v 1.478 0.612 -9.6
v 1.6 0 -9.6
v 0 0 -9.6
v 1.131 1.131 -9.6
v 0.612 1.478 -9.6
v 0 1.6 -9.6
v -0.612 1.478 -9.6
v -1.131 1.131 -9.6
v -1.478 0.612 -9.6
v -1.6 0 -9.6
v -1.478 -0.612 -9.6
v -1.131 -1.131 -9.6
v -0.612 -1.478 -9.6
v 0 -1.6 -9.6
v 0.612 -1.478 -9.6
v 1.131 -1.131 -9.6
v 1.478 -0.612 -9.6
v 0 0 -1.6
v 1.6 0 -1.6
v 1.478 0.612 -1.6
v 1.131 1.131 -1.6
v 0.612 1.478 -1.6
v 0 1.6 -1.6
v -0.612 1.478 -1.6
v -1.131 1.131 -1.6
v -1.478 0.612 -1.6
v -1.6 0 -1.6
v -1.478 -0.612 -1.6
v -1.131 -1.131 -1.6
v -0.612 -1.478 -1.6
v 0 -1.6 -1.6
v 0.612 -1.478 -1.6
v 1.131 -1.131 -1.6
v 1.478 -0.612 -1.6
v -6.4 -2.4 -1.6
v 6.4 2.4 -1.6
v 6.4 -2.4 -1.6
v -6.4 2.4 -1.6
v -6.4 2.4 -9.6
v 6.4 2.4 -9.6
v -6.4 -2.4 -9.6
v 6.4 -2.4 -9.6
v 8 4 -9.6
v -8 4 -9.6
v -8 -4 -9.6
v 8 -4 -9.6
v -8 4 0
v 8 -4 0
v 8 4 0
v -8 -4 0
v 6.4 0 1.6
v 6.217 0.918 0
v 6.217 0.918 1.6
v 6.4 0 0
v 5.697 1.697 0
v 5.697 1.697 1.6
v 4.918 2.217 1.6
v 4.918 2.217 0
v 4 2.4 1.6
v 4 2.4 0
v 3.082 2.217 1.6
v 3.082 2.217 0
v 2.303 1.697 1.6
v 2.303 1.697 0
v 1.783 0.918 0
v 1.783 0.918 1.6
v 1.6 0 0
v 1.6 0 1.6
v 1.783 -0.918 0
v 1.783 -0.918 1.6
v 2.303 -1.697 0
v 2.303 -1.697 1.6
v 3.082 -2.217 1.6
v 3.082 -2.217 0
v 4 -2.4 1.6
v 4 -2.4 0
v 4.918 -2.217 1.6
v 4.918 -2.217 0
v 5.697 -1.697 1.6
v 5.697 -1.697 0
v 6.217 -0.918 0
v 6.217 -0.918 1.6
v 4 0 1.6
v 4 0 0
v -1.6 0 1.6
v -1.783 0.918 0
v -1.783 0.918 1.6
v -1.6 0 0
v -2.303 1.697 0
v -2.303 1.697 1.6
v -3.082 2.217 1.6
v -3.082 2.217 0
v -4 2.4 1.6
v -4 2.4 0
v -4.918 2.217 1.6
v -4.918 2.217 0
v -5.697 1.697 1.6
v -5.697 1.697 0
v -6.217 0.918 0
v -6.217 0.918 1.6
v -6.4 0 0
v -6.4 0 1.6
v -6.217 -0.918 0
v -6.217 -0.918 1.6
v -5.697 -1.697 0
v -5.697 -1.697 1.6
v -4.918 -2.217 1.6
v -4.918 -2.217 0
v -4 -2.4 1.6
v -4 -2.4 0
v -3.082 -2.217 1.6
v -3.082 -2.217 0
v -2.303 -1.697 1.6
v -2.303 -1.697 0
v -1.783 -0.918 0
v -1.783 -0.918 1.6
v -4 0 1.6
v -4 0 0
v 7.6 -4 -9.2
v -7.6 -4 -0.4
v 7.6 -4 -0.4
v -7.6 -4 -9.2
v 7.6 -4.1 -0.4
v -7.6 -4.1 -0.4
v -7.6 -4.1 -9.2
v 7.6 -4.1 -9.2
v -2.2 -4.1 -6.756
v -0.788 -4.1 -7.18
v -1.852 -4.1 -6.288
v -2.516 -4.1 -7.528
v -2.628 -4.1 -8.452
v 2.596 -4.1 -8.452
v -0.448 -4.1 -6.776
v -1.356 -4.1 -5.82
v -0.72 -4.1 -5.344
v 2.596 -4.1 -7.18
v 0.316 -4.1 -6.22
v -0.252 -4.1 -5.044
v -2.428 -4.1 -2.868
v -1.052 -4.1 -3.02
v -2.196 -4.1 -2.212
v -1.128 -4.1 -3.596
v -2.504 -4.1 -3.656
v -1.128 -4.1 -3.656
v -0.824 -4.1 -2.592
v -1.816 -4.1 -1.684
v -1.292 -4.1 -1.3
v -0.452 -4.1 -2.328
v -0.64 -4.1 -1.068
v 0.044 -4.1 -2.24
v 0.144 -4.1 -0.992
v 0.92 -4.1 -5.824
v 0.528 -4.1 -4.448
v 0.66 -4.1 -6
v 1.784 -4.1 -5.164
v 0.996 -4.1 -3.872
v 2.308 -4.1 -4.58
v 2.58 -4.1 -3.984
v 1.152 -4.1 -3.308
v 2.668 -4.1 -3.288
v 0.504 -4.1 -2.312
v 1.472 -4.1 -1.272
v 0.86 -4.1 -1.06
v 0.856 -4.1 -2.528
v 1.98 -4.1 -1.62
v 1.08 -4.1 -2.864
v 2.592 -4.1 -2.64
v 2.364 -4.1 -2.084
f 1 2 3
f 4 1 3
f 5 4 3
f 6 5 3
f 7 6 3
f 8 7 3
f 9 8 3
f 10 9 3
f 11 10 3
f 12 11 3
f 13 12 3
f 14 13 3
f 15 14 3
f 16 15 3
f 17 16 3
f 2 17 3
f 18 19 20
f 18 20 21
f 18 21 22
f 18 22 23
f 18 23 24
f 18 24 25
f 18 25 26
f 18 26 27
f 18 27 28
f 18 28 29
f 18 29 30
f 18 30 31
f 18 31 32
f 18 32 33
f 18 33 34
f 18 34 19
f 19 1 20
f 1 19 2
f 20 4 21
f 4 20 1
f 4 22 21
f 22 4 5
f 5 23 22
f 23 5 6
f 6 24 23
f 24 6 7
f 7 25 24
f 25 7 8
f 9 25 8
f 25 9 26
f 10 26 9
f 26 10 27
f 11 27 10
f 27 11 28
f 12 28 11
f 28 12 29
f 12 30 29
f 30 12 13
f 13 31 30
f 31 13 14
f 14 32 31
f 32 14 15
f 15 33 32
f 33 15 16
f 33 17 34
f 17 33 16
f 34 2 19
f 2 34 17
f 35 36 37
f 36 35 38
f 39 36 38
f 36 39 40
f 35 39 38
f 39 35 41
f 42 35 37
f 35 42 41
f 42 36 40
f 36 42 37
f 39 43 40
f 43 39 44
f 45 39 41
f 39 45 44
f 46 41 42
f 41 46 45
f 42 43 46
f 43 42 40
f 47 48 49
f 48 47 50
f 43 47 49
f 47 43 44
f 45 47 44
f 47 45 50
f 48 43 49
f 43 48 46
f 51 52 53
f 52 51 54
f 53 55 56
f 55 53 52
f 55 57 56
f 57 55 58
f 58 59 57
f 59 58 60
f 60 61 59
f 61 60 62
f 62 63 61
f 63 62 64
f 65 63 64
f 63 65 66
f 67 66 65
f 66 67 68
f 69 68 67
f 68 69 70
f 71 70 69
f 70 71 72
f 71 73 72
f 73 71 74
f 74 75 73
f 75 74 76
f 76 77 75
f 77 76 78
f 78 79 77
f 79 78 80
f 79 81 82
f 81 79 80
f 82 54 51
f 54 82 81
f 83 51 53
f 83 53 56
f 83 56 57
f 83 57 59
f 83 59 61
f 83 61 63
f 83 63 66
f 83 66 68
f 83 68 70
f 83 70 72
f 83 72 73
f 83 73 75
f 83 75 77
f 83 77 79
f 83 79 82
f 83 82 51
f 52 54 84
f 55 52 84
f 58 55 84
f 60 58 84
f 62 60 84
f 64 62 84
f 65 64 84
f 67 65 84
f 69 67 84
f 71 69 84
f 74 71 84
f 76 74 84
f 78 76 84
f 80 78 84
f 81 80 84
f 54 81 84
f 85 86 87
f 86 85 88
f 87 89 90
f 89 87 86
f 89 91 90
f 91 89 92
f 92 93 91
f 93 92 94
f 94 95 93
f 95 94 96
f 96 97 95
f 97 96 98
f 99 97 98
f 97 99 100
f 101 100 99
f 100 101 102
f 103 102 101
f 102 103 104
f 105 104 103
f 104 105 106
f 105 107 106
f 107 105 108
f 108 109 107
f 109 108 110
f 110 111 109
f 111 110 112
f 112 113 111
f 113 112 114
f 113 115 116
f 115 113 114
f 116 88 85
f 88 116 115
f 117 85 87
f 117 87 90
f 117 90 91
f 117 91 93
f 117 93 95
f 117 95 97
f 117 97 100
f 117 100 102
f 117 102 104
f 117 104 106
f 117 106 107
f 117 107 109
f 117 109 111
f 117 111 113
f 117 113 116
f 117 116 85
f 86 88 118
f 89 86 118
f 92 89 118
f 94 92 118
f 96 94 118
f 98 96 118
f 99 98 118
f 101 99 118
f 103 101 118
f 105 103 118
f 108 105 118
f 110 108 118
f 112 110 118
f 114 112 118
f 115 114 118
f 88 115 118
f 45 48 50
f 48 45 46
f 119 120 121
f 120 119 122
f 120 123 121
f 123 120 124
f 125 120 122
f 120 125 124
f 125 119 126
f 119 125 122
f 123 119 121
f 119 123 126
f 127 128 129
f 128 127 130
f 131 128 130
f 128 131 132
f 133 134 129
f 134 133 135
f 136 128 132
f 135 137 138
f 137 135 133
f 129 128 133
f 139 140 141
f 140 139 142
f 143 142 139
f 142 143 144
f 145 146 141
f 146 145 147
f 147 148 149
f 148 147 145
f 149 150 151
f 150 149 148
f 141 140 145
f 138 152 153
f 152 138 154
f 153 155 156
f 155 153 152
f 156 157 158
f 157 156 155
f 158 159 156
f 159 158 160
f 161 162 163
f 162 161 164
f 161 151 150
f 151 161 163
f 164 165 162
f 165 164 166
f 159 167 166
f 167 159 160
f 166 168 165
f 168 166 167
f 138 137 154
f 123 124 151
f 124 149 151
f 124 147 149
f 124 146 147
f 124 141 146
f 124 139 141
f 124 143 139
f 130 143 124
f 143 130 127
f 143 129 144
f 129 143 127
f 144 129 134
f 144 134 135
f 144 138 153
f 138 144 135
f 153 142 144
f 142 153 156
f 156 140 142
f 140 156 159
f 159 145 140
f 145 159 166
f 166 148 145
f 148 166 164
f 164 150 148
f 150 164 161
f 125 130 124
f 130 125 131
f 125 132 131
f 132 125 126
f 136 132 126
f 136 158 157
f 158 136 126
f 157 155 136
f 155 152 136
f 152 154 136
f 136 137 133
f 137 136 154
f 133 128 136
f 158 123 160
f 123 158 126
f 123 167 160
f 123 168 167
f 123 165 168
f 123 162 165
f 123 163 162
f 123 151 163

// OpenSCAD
// file: ../p/4-4edge.scad
use <../lib.scad>
function ldraw_lib__4_4edge() = [
// 0 Circle 1.0
// 0 Name: 4-4edge.dat
// 0 Author: James Jessiman
// 0 !LDRAW_ORG Primitive UPDATE 2017-01
// 0 !LICENSE Licensed under CC BY 2.0 and CC BY 4.0 : see CAreadme.txt
// 
// 0 BFC CERTIFY CCW
  [0,"BFC","CERTIFY"],
  [0,"BFC","CCW"],
// 
// 0 !HISTORY 1998-12-15 [PTadmin] Official Update 1998-10
// 0 !HISTORY 2005-12-28 [PTadmin] Official Update 2005-01
// 0 !HISTORY 2007-06-24 [PTadmin] Header formatted for Contributor Agreement
// 0 !HISTORY 2008-07-01 [PTadmin] Official Update 2008-01
// 0 !HISTORY 2017-01-15 [Steffen] BFCed
// 0 !HISTORY 2017-12-30 [PTadmin] Official Update 2017-01
// 
// 
// 2 24 1 0 0 0.9239 0 0.3827
  [2,24,1,0,0,0.9239,0,0.3827],
// 2 24 0.9239 0 0.3827 0.7071 0 0.7071
  [2,24,0.9239,0,0.3827,0.7071,0,0.7071],
// 2 24 0.7071 0 0.7071 0.3827 0 0.9239
  [2,24,0.7071,0,0.7071,0.3827,0,0.9239],
// 2 24 0.3827 0 0.9239 0 0 1
  [2,24,0.3827,0,0.9239,0,0,1],
// 2 24 0 0 1 -0.3827 0 0.9239
  [2,24,0,0,1,-0.3827,0,0.9239],
// 2 24 -0.3827 0 0.9239 -0.7071 0 0.7071
  [2,24,-0.3827,0,0.9239,-0.7071,0,0.7071],
// 2 24 -0.7071 0 0.7071 -0.9239 0 0.3827
  [2,24,-0.7071,0,0.7071,-0.9239,0,0.3827],
// 2 24 -0.9239 0 0.3827 -1 0 -0
  [2,24,-0.9239,0,0.3827,-1,0,-0],
// 2 24 -1 0 -0 -0.9239 0 -0.3827
  [2,24,-1,0,-0,-0.9239,0,-0.3827],
// 2 24 -0.9239 0 -0.3827 -0.7071 0 -0.7071
  [2,24,-0.9239,0,-0.3827,-0.7071,0,-0.7071],
// 2 24 -0.7071 0 -0.7071 -0.3827 0 -0.9239
  [2,24,-0.7071,0,-0.7071,-0.3827,0,-0.9239],
// 2 24 -0.3827 0 -0.9239 0 0 -1
  [2,24,-0.3827,0,-0.9239,0,0,-1],
// 2 24 0 0 -1 0.3827 0 -0.9239
  [2,24,0,0,-1,0.3827,0,-0.9239],
// 2 24 0.3827 0 -0.9239 0.7071 0 -0.7071
  [2,24,0.3827,0,-0.9239,0.7071,0,-0.7071],
// 2 24 0.7071 0 -0.7071 0.9239 0 -0.3827
  [2,24,0.7071,0,-0.7071,0.9239,0,-0.3827],
// 2 24 0.9239 0 -0.3827 1 0 0
  [2,24,0.9239,0,-0.3827,1,0,0],
];
module ldraw_lib__4_4edge(step=0, col=false, unit=2/5, alt=false, line=0.2, solid=!$preview)
    makepoly(ldraw_lib__4_4edge(), step=step, col=col, unit=unit, alt=alt, line=line, solid=solid);
ldraw_lib__4_4edge(line=0.2);
// file: ../p/4-4disc.scad
use <../lib.scad>
function ldraw_lib__4_4disc() = [
// 0 Disc 1.0
// 0 Name: 4-4disc.dat
// 0 Author: James Jessiman
// 0 !LDRAW_ORG Primitive UPDATE 2002-02
// 0 !LICENSE Licensed under CC BY 2.0 and CC BY 4.0 : see CAreadme.txt
// 
// 0 BFC CERTIFY CCW
  [0,"BFC","CERTIFY"],
  [0,"BFC","CCW"],
// 
// 0 !HISTORY 1998-12-15 [PTadmin] Official Update 1998-10
// 0 !HISTORY 2002-03-23 [sbliss] Added BFC statement
// 0 !HISTORY 2002-04-25 [PTadmin] Official Update 2002-02
// 0 !HISTORY 2007-06-24 [PTadmin] Header formatted for Contributor Agreement
// 0 !HISTORY 2008-07-01 [PTadmin] Official Update 2008-01
// 
// 
// 3 16 0 0 0 1 0 0 0.9239 0 0.3827
  [3,16,0,0,0,1,0,0,0.9239,0,0.3827],
// 3 16 0 0 0 0.9239 0 0.3827 0.7071 0 0.7071
  [3,16,0,0,0,0.9239,0,0.3827,0.7071,0,0.7071],
// 3 16 0 0 0 0.7071 0 0.7071 0.3827 0 0.9239
  [3,16,0,0,0,0.7071,0,0.7071,0.3827,0,0.9239],
// 3 16 0 0 0 0.3827 0 0.9239 0 0 1
  [3,16,0,0,0,0.3827,0,0.9239,0,0,1],
// 3 16 0 0 0 0 0 1 -0.3827 0 0.9239
  [3,16,0,0,0,0,0,1,-0.3827,0,0.9239],
// 3 16 0 0 0 -0.3827 0 0.9239 -0.7071 0 0.7071
  [3,16,0,0,0,-0.3827,0,0.9239,-0.7071,0,0.7071],
// 3 16 0 0 0 -0.7071 0 0.7071 -0.9239 0 0.3827
  [3,16,0,0,0,-0.7071,0,0.7071,-0.9239,0,0.3827],
// 3 16 0 0 0 -0.9239 0 0.3827 -1 0 -0
  [3,16,0,0,0,-0.9239,0,0.3827,-1,0,-0],
// 3 16 0 0 0 -1 0 -0 -0.9239 0 -0.3827
  [3,16,0,0,0,-1,0,-0,-0.9239,0,-0.3827],
// 3 16 0 0 0 -0.9239 0 -0.3827 -0.7071 0 -0.7071
  [3,16,0,0,0,-0.9239,0,-0.3827,-0.7071,0,-0.7071],
// 3 16 0 0 0 -0.7071 0 -0.7071 -0.3827 0 -0.9239
  [3,16,0,0,0,-0.7071,0,-0.7071,-0.3827,0,-0.9239],
// 3 16 0 0 0 -0.3827 0 -0.9239 0 0 -1
  [3,16,0,0,0,-0.3827,0,-0.9239,0,0,-1],
// 3 16 0 0 0 0 0 -1 0.3827 0 -0.9239
  [3,16,0,0,0,0,0,-1,0.3827,0,-0.9239],
// 3 16 0 0 0 0.3827 0 -0.9239 0.7071 0 -0.7071
  [3,16,0,0,0,0.3827,0,-0.9239,0.7071,0,-0.7071],
// 3 16 0 0 0 0.7071 0 -0.7071 0.9239 0 -0.3827
  [3,16,0,0,0,0.7071,0,-0.7071,0.9239,0,-0.3827],
// 3 16 0 0 0 0.9239 0 -0.3827 1 0 0
  [3,16,0,0,0,0.9239,0,-0.3827,1,0,0],
// 0
];
module ldraw_lib__4_4disc(step=0, col=false, unit=2/5, alt=false, line=0.2, solid=!$preview)
    makepoly(ldraw_lib__4_4disc(), step=step, col=col, unit=unit, alt=alt, line=line, solid=solid);
ldraw_lib__4_4disc(line=0.2);
// file: ../p/4-4cyli.scad
use <../lib.scad>
$fa=1; $fs=0.2;
function ldraw_lib__4_4cyli(realsolid=false) = [
// 0 Cylinder 1.0
// 0 Name: 4-4cyli.dat
// 0 Author: James Jessiman
// 0 !LDRAW_ORG Primitive UPDATE 2005-01
// 0 !LICENSE Licensed under CC BY 2.0 and CC BY 4.0 : see CAreadme.txt
// 
// 0 BFC CERTIFY CCW
  [0,"BFC","CERTIFY"],
  [0,"BFC","CCW"],
// 
// 0 !HISTORY 1998-12-15 [PTadmin] Official Update 1998-10
// 0 !HISTORY 2002-03-23 [sbliss] Added BFC statement; merged headers from files in distributions LDraw 0.27 and Complete.
// 0 !HISTORY 2002-04-25 [PTadmin] Official Update 2002-02
// 0 !HISTORY 2004-12-14 [guyvivan] BFC CCW
// 0 !HISTORY 2005-12-28 [PTadmin] Official Update 2005-01
// 0 !HISTORY 2007-06-24 [PTadmin] Header formatted for Contributor Agreement
// 0 !HISTORY 2008-07-01 [PTadmin] Official Update 2008-01
// 
// 
// 4 16 1 1 0 0.9239 1 0.3827 0.9239 0 0.3827 1 0 0
  [4,16,1,1,0,0.9239,1,0.3827,0.9239,0,0.3827,1,0,0],
// 5 24 1 0 0 1 1 0 0.9239 0 0.3827 0.9239 0 -0.3827
  [5,24,1,0,0,1,1,0,0.9239,0,0.3827,0.9239,0,-0.3827],
// 4 16 0.9239 1 0.3827 0.7071 1 0.7071 0.7071 0 0.7071 0.9239 0 0.3827
  [4,16,0.9239,1,0.3827,0.7071,1,0.7071,0.7071,0,0.7071,0.9239,0,0.3827],
// 5 24 0.9239 0 0.3827 0.9239 1 0.3827 0.7071 0 0.7071 1 0 0
  [5,24,0.9239,0,0.3827,0.9239,1,0.3827,0.7071,0,0.7071,1,0,0],
// 4 16 0.7071 1 0.7071 0.3827 1 0.9239 0.3827 0 0.9239 0.7071 0 0.7071
  [4,16,0.7071,1,0.7071,0.3827,1,0.9239,0.3827,0,0.9239,0.7071,0,0.7071],
// 5 24 0.7071 0 0.7071 0.7071 1 0.7071 0.3827 0 0.9239 0.9239 0 0.3827
  [5,24,0.7071,0,0.7071,0.7071,1,0.7071,0.3827,0,0.9239,0.9239,0,0.3827],
// 4 16 0.3827 1 0.9239 0 1 1 0 0 1 0.3827 0 0.9239
  [4,16,0.3827,1,0.9239,0,1,1,0,0,1,0.3827,0,0.9239],
// 5 24 0.3827 0 0.9239 0.3827 1 0.9239 0 0 1 0.7071 0 0.7071
  [5,24,0.3827,0,0.9239,0.3827,1,0.9239,0,0,1,0.7071,0,0.7071],
// 4 16 0 1 1 -0.3827 1 0.9239 -0.3827 0 0.9239 0 0 1
  [4,16,0,1,1,-0.3827,1,0.9239,-0.3827,0,0.9239,0,0,1],
// 5 24 0 0 1 0 1 1 -0.3827 0 0.9239 0.3827 0 0.9239
  [5,24,0,0,1,0,1,1,-0.3827,0,0.9239,0.3827,0,0.9239],
// 4 16 -0.3827 1 0.9239 -0.7071 1 0.7071 -0.7071 0 0.7071 -0.3827 0 0.9239
  [4,16,-0.3827,1,0.9239,-0.7071,1,0.7071,-0.7071,0,0.7071,-0.3827,0,0.9239],
// 5 24 -0.3827 0 0.9239 -0.3827 1 0.9239 -0.7071 0 0.7071 0 0 1
  [5,24,-0.3827,0,0.9239,-0.3827,1,0.9239,-0.7071,0,0.7071,0,0,1],
// 4 16 -0.7071 1 0.7071 -0.9239 1 0.3827 -0.9239 0 0.3827 -0.7071 0 0.7071
  [4,16,-0.7071,1,0.7071,-0.9239,1,0.3827,-0.9239,0,0.3827,-0.7071,0,0.7071],
// 5 24 -0.7071 0 0.7071 -0.7071 1 0.7071 -0.9239 0 0.3827 -0.3827 0 0.9239
  [5,24,-0.7071,0,0.7071,-0.7071,1,0.7071,-0.9239,0,0.3827,-0.3827,0,0.9239],
// 4 16 -0.9239 1 0.3827 -1 1 0 -1 0 0 -0.9239 0 0.3827
  [4,16,-0.9239,1,0.3827,-1,1,0,-1,0,0,-0.9239,0,0.3827],
// 5 24 -0.9239 0 0.3827 -0.9239 1 0.3827 -1 0 0 -0.7071 0 0.7071
  [5,24,-0.9239,0,0.3827,-0.9239,1,0.3827,-1,0,0,-0.7071,0,0.7071],
// 4 16 -1 1 0 -0.9239 1 -0.3827 -0.9239 0 -0.3827 -1 0 0
  [4,16,-1,1,0,-0.9239,1,-0.3827,-0.9239,0,-0.3827,-1,0,0],
// 5 24 -1 0 0 -1 1 0 -0.9239 0 -0.3827 -0.9239 0 0.3827
  [5,24,-1,0,0,-1,1,0,-0.9239,0,-0.3827,-0.9239,0,0.3827],
// 4 16 -0.9239 1 -0.3827 -0.7071 1 -0.7071 -0.7071 0 -0.7071 -0.9239 0 -0.3827
  [4,16,-0.9239,1,-0.3827,-0.7071,1,-0.7071,-0.7071,0,-0.7071,-0.9239,0,-0.3827],
// 5 24 -0.9239 0 -0.3827 -0.9239 1 -0.3827 -0.7071 0 -0.7071 -1 0 0
  [5,24,-0.9239,0,-0.3827,-0.9239,1,-0.3827,-0.7071,0,-0.7071,-1,0,0],
// 4 16 -0.7071 1 -0.7071 -0.3827 1 -0.9239 -0.3827 0 -0.9239 -0.7071 0 -0.7071
  [4,16,-0.7071,1,-0.7071,-0.3827,1,-0.9239,-0.3827,0,-0.9239,-0.7071,0,-0.7071],
// 5 24 -0.7071 0 -0.7071 -0.7071 1 -0.7071 -0.3827 0 -0.9239 -0.9239 0 -0.3827
  [5,24,-0.7071,0,-0.7071,-0.7071,1,-0.7071,-0.3827,0,-0.9239,-0.9239,0,-0.3827],
// 4 16 -0.3827 1 -0.9239 0 1 -1 0 0 -1 -0.3827 0 -0.9239
  [4,16,-0.3827,1,-0.9239,0,1,-1,0,0,-1,-0.3827,0,-0.9239],
// 5 24 -0.3827 0 -0.9239 -0.3827 1 -0.9239 0 0 -1 -0.7071 0 -0.7071
  [5,24,-0.3827,0,-0.9239,-0.3827,1,-0.9239,0,0,-1,-0.7071,0,-0.7071],
// 4 16 0 1 -1 0.3827 1 -0.9239 0.3827 0 -0.9239 0 0 -1
  [4,16,0,1,-1,0.3827,1,-0.9239,0.3827,0,-0.9239,0,0,-1],
// 5 24 0 0 -1 0 1 -1 0.3827 0 -0.9239 -0.3827 0 -0.9239
  [5,24,0,0,-1,0,1,-1,0.3827,0,-0.9239,-0.3827,0,-0.9239],
// 4 16 0.3827 1 -0.9239 0.7071 1 -0.7071 0.7071 0 -0.7071 0.3827 0 -0.9239
  [4,16,0.3827,1,-0.9239,0.7071,1,-0.7071,0.7071,0,-0.7071,0.3827,0,-0.9239],
// 5 24 0.3827 0 -0.9239 0.3827 1 -0.9239 0.7071 0 -0.7071 0 0 -1
  [5,24,0.3827,0,-0.9239,0.3827,1,-0.9239,0.7071,0,-0.7071,0,0,-1],
// 4 16 0.7071 1 -0.7071 0.9239 1 -0.3827 0.9239 0 -0.3827 0.7071 0 -0.7071
  [4,16,0.7071,1,-0.7071,0.9239,1,-0.3827,0.9239,0,-0.3827,0.7071,0,-0.7071],
// 5 24 0.7071 0 -0.7071 0.7071 1 -0.7071 0.9239 0 -0.3827 0.3827 0 -0.9239
  [5,24,0.7071,0,-0.7071,0.7071,1,-0.7071,0.9239,0,-0.3827,0.3827,0,-0.9239],
// 4 16 0.9239 1 -0.3827 1 1 0 1 0 0 0.9239 0 -0.3827
  [4,16,0.9239,1,-0.3827,1,1,0,1,0,0,0.9239,0,-0.3827],
// 5 24 0.9239 0 -0.3827 0.9239 1 -0.3827 1 0 0 0.7071 0 -0.7071
  [5,24,0.9239,0,-0.3827,0.9239,1,-0.3827,1,0,0,0.7071,0,-0.7071],
// 0
];
module ldraw_lib__4_4cyli(step=0, col=false, unit=2/5, alt=false, line=0.2, solid=!$preview)
    makepoly(ldraw_lib__4_4cyli(solid), step=step, col=col, unit=unit, alt=alt, line=line, solid=solid);
ldraw_lib__4_4cyli(line=0.2);
// file: ../p/stud3.scad
use <../lib.scad>
use <4-4cyli.scad>
use <4-4disc.scad>
use <4-4edge.scad>
function ldraw_lib__stud3() = [
// 0 Stud Tube Solid
// 0 Name: stud3.dat
// 0 Author: James Jessiman
// 0 !LDRAW_ORG Primitive UPDATE 2012-01
// 0 !LICENSE Licensed under CC BY 4.0 : see CAreadme.txt
// 
// 0 BFC CERTIFY CCW
  [0,"BFC","CERTIFY"],
  [0,"BFC","CCW"],
// 
// 0 !HISTORY 2002-04-04 [sbliss] Modified for BFC compliance
// 0 !HISTORY 2002-04-25 [PTadmin] Official Update 2002-02
// 0 !HISTORY 2007-06-24 [PTadmin] Header formatted for Contributor Agreement
// 0 !HISTORY 2008-07-01 [PTadmin] Official Update 2008-01
// 0 !HISTORY 2012-02-16 [Philo] Changed to CCW
// 0 !HISTORY 2012-03-30 [PTadmin] Official Update 2012-01
// 
// 
// 1 16 0 -4 0 4 0 0 0 1 0 0 0 4 4-4edge.dat
  [1,16,0,-4,0,4,0,0,0,1,0,0,0,4, ldraw_lib__4_4edge()],
// 1 16 0 0 0 4 0 0 0 1 0 0 0 4 4-4edge.dat
  [1,16,0,0,0,4,0,0,0,1,0,0,0,4, ldraw_lib__4_4edge()],
// 1 16 0 -4 0 4 0 0 0 1 0 0 0 4 4-4disc.dat
  [1,16,0,-4,0,4,0,0,0,1,0,0,0,4, ldraw_lib__4_4disc()],
  [-1,16,0,0,0,4,0,0,0,-1,0,0,0,4, ldraw_lib__4_4disc()],
// 1 16 0 -4 0 4 0 0 0 4 0 0 0 4 4-4cyli.dat
  [1,16,0,-4,0,4,0,0,0,4,0,0,0,4, ldraw_lib__4_4cyli()],
];
module ldraw_lib__stud3(step=0, col=false, unit=2/5, alt=false, line=0.2, solid=!$preview)
    makepoly(ldraw_lib__stud3(), step=step, col=col, unit=unit, alt=alt, line=line, solid=solid);
ldraw_lib__stud3(line=0.2);
// file: ../p/stud.scad
use <../lib.scad>
use <4-4cyli.scad>
use <4-4disc.scad>
use <4-4edge.scad>
function ldraw_lib__stud() = [
// 0 Stud
// 0 Name: stud.dat
// 0 Author: James Jessiman
// 0 !LDRAW_ORG Primitive UPDATE 2012-01
// 0 !LICENSE Licensed under CC BY 4.0 : see CAreadme.txt
// 
// 0 BFC CERTIFY CCW
  [0,"BFC","CERTIFY"],
  [0,"BFC","CCW"],
// 
// 0 !HISTORY 2002-04-04 [sbliss] Modified for BFC compliance
// 0 !HISTORY 2002-04-25 [PTadmin] Official Update 2002-02
// 0 !HISTORY 2007-06-24 [PTadmin] Header formatted for Contributor Agreement
// 0 !HISTORY 2008-07-01 [PTadmin] Official Update 2008-01
// 0 !HISTORY 2012-02-16 [Philo] Changed to CCW
// 0 !HISTORY 2012-03-30 [PTadmin] Official Update 2012-01
// 
// 
// 1 16 0 0 0 6 0 0 0 1 0 0 0 6 4-4edge.dat
  [1,16,0,0,0,6,0,0,0,1,0,0,0,6, ldraw_lib__4_4edge()],
// 1 16 0 -4 0 6 0 0 0 1 0 0 0 6 4-4edge.dat
  [1,16,0,-4,0,6,0,0,0,1,0,0,0,6, ldraw_lib__4_4edge()],
// 1 16 0 0 0 6 0 0 0 -4 0 0 0 6 4-4cyli.dat
  [1,16,0,0,0,6,0,0,0,-4,0,0,0,6, ldraw_lib__4_4cyli()],
// 1 16 0 -4 0 6 0 0 0 1 0 0 0 6 4-4disc.dat
  [1,16,0,-4,0,6,0,0,0,1,0,0,0,6, ldraw_lib__4_4disc()],
  [-1,16,0,0,0,6,0,0,0,-1,0,0,0,6, ldraw_lib__4_4disc()],
];
module ldraw_lib__stud(step=0, col=false, unit=2/5, alt=false, line=0.2, solid=!$preview)
    makepoly(ldraw_lib__stud(), step=step, col=col, unit=unit, alt=alt, line=line, solid=solid);
ldraw_lib__stud(line=0.2);
// file: ../p/box5.scad
use <../lib.scad>
function ldraw_lib__box5() = [
// 0 Box with 5 Faces and All Edges
// 0 Name: box5.dat
// 0 Author: James Jessiman
// 0 !LDRAW_ORG Primitive UPDATE 2012-01
// 0 !LICENSE Licensed under CC BY 2.0 and CC BY 4.0 : see CAreadme.txt
// 
// 0 BFC CERTIFY CCW
  [0,"BFC","CERTIFY"],
  [0,"BFC","CCW"],
// 
// 0 !HISTORY 2002-04-03 [sbliss] Modified for BFC compliance
// 0 !HISTORY 2002-04-25 [PTadmin] Official Update 2002-02
// 0 !HISTORY 2007-06-24 [PTadmin] Header formatted for Contributor Agreement
// 0 !HISTORY 2008-07-01 [PTadmin] Official Update 2008-01
// 0 !HISTORY 2012-02-16 [Philo] Changed to CCW
// 0 !HISTORY 2012-03-30 [PTadmin] Official Update 2012-01
// 
// 
// 2 24 1 1 1 -1 1 1
  [2,24,1,1,1,-1,1,1],
// 2 24 -1 1 1 -1 1 -1
  [2,24,-1,1,1,-1,1,-1],
// 2 24 -1 1 -1 1 1 -1
  [2,24,-1,1,-1,1,1,-1],
// 2 24 1 1 -1 1 1 1
  [2,24,1,1,-1,1,1,1],
// 2 24 1 0 1 -1 0 1
  [2,24,1,0,1,-1,0,1],
// 2 24 -1 0 1 -1 0 -1
  [2,24,-1,0,1,-1,0,-1],
// 2 24 -1 0 -1 1 0 -1
  [2,24,-1,0,-1,1,0,-1],
// 2 24 1 0 -1 1 0 1
  [2,24,1,0,-1,1,0,1],
// 2 24 1 0 1 1 1 1
  [2,24,1,0,1,1,1,1],
// 2 24 -1 0 1 -1 1 1
  [2,24,-1,0,1,-1,1,1],
// 2 24 1 0 -1 1 1 -1
  [2,24,1,0,-1,1,1,-1],
// 2 24 -1 0 -1 -1 1 -1
  [2,24,-1,0,-1,-1,1,-1],
// 4 16 -1 1 1 1 1 1 1 1 -1 -1 1 -1
  [4,16,-1,1,1,1,1,1,1,1,-1,-1,1,-1],
// 4 16 -1 1 1 -1 0 1 1 0 1 1 1 1
  [4,16,-1,1,1,-1,0,1,1,0,1,1,1,1],
// 4 16 -1 1 -1 -1 0 -1 -1 0 1 -1 1 1
  [4,16,-1,1,-1,-1,0,-1,-1,0,1,-1,1,1],
// 4 16 1 1 -1 1 0 -1 -1 0 -1 -1 1 -1
  [4,16,1,1,-1,1,0,-1,-1,0,-1,-1,1,-1],
// 4 16 1 1 1 1 0 1 1 0 -1 1 1 -1
  [4,16,1,1,1,1,0,1,1,0,-1,1,1,-1],
];
makepoly(ldraw_lib__box5(), line=0.2);
// file: ../p/box4t.scad
use <../lib.scad>
function ldraw_lib__box4t() = [
// 0 Box with 4 Adjacent Faces and All Edges
// 0 Name: box4t.dat
// 0 Author: Tore Eriksson [Tore_Eriksson]
// 0 !LDRAW_ORG Primitive UPDATE 2003-02
// 0 !LICENSE Licensed under CC BY 2.0 and CC BY 4.0 : see CAreadme.txt
// 
// 0 BFC CERTIFY CCW
  [0,"BFC","CERTIFY"],
  [0,"BFC","CCW"],
// 
// 0 !HISTORY 1997-09-29 [PTadmin] Official Update 1997-15
// 0 !HISTORY 2002-08-31 [izanette] Modified with WINDZ for BFC compliance
// 0 !HISTORY 2003-08-01 [PTadmin] Official Update 2003-02
// 0 !HISTORY 2007-06-24 [PTadmin] Header formatted for Contributor Agreement
// 0 !HISTORY 2008-07-01 [PTadmin] Official Update 2008-01
// 
// 
// 2 24 1 1 1 -1 1 1
  [2,24,1,1,1,-1,1,1],
// 2 24 -1 1 1 -1 1 -1
  [2,24,-1,1,1,-1,1,-1],
// 2 24 -1 1 -1 1 1 -1
  [2,24,-1,1,-1,1,1,-1],
// 2 24 1 1 -1 1 1 1
  [2,24,1,1,-1,1,1,1],
// 2 24 1 0 1 -1 0 1
  [2,24,1,0,1,-1,0,1],
// 2 24 -1 0 1 -1 0 -1
  [2,24,-1,0,1,-1,0,-1],
// 2 24 -1 0 -1 1 0 -1
  [2,24,-1,0,-1,1,0,-1],
// 2 24 1 0 -1 1 0 1
  [2,24,1,0,-1,1,0,1],
// 2 24 1 0 1 1 1 1
  [2,24,1,0,1,1,1,1],
// 2 24 -1 0 1 -1 1 1
  [2,24,-1,0,1,-1,1,1],
// 2 24 1 0 -1 1 1 -1
  [2,24,1,0,-1,1,1,-1],
// 2 24 -1 0 -1 -1 1 -1
  [2,24,-1,0,-1,-1,1,-1],
// 4 16 1 1 1 1 1 -1 -1 1 -1 -1 1 1
  [4,16,1,1,1,1,1,-1,-1,1,-1,-1,1,1],
// 4 16 1 1 1 -1 1 1 -1 0 1 1 0 1
  [4,16,1,1,1,-1,1,1,-1,0,1,1,0,1],
// 4 16 -1 1 1 -1 1 -1 -1 0 -1 -1 0 1
  [4,16,-1,1,1,-1,1,-1,-1,0,-1,-1,0,1],
// 0 4 16 -1 1 -1 -1 0 -1 1 0 -1 1 1 -1
// 4 16 1 1 -1 1 1 1 1 0 1 1 0 -1
  [4,16,1,1,-1,1,1,1,1,0,1,1,0,-1],
// 0
];
makepoly(ldraw_lib__box4t(), line=0.2);
// file: s/3004s01.scad
use <../../lib.scad>
use <../../p/box4t.scad>
use <../../p/box5.scad>
use <../../p/stud.scad>
use <../../p/stud3.scad>
$fa=1; $fs=0.2;
function ldraw_lib__s__3004s01(realsolid=false) = [
// 0 ~Brick  1 x  2 without Front Face
// 0 Name: s\3004s01.dat
// 0 Author: James Jessiman
// 0 !LDRAW_ORG Subpart UPDATE 2003-03
// 0 !LICENSE Licensed under CC BY 2.0 and CC BY 4.0 : see CAreadme.txt
// 
// 0 BFC CERTIFY CCW
  [0,"BFC","CERTIFY"],
  [0,"BFC","CCW"],
// 
// 0 !HISTORY 2003-09-07 [jriley] Subfiling, BFC
// 0 !HISTORY 2003-12-19 [PTadmin] Official Update 2003-03
// 0 !HISTORY 2007-08-29 [PTadmin] Header formatted for Contributor Agreement
// 0 !HISTORY 2008-07-01 [PTadmin] Official Update 2008-01
// 
// 
// 1 16 0 4 0 1 0 0 0 -5 0 0 0 1 stud3.dat
  [1,16,0,4,0,1,0,0,0,-5,0,0,0,1, ldraw_lib__stud3(realsolid)],
// 0 BFC INVERTNEXT
  [0,"BFC","INVERTNEXT"],
// 1 16 0 24 0 16 0 0 0 -20 0 0 0 6 box5.dat
  [1,16,0,24,0,16,0,0,0,-20,0,0,0,6, ldraw_lib__box5(realsolid)],
// 4 16 20 24 10 16 24 6 -16 24 6 -20 24 10
  [4,16,20,24,10,16,24,6,-16,24,6,-20,24,10],
// 4 16 -20 24 10 -16 24 6 -16 24 -6 -20 24 -10
  [4,16,-20,24,10,-16,24,6,-16,24,-6,-20,24,-10],
// 4 16 -20 24 -10 -16 24 -6 16 24 -6 20 24 -10
  [4,16,-20,24,-10,-16,24,-6,16,24,-6,20,24,-10],
// 4 16 20 24 -10 16 24 -6 16 24 6 20 24 10
  [4,16,20,24,-10,16,24,-6,16,24,6,20,24,10],
// 1 16 0 24 0 20 0 0 0 -24 0 0 0 10 box4t.dat
  [1,16,0,24,0,20,0,0,0,-24,0,0,0,10, ldraw_lib__box4t(realsolid)],
// 1 16 10 0 0 1 0 0 0 1 0 0 0 1 stud.dat
  [1,16,10,0,0,1,0,0,0,1,0,0,0,1, ldraw_lib__stud(realsolid)],
// 1 16 -10 0 0 1 0 0 0 1 0 0 0 1 stud.dat
  [1,16,-10,0,0,1,0,0,0,1,0,0,0,1, ldraw_lib__stud(realsolid)],
// 0
];
module ldraw_lib__s__3004s01(step=0, col=false, unit=2/5, alt=false, line=0.2, solid=!$preview)
    makepoly(ldraw_lib__s__3004s01(solid), step=step, col=col, unit=unit, alt=alt, line=line, solid=solid);
ldraw_lib__s__3004s01(line=0.2);
// file: s/004452cs02.scad
use <../../lib.scad>
$fa=1; $fs=0.2;
function ldraw_lib__s__004452cs02(realsolid=false) = [
// 0 ~Sticker  1.1 x  1.9 with Number "2" - Background
// 0 Name: s\004452cs02.dat
// 0 Author: Takeshi Takahashi [RainbowDolphin]
// 0 !LDRAW_ORG Subpart UPDATE 2022-04
// 0 !LICENSE Licensed under CC BY 2.0 and CC BY 4.0 : see CAreadme.txt
// 
// 0 BFC CERTIFY CCW
  [0,"BFC","CERTIFY"],
  [0,"BFC","CCW"],
// 
// 0 !HISTORY 2022-07-18 [PTadmin] Official Update 2022-04
// 
// 
// 3 16 19 -.25 11 -19 -.25 11 .36 -.25 9.52
  [3,16,19,-.25,11,-19,-.25,11,.36,-.25,9.52],
// 3 16 -19 -.25 11 -1.6 -.25 9.33 .36 -.25 9.52
  [3,16,-19,-.25,11,-1.6,-.25,9.33,.36,-.25,9.52],
// 3 16 -19 -.25 11 -3.23 -.25 8.75 -1.6 -.25 9.33
  [3,16,-19,-.25,11,-3.23,-.25,8.75,-1.6,-.25,9.33],
// 3 16 -19 -.25 11 -4.54 -.25 7.79 -3.23 -.25 8.75
  [3,16,-19,-.25,11,-4.54,-.25,7.79,-3.23,-.25,8.75],
// 3 16 -19 -.25 11 -5.49 -.25 6.47 -4.54 -.25 7.79
  [3,16,-19,-.25,11,-5.49,-.25,6.47,-4.54,-.25,7.79],
// 3 16 -19 -.25 11 -6.07 -.25 4.83 -5.49 -.25 6.47
  [3,16,-19,-.25,11,-6.07,-.25,4.83,-5.49,-.25,6.47],
// 3 16 -19 -.25 11 -6.26 -.25 2.86 -6.07 -.25 4.83
  [3,16,-19,-.25,11,-6.26,-.25,2.86,-6.07,-.25,4.83],
// 4 16 -6.26 -.25 2.86 -19 -.25 11 -6.29 -.25 -6.82 -5.5 -.25 -4.89
  [4,16,-6.26,-.25,2.86,-19,-.25,11,-6.29,-.25,-6.82,-5.5,-.25,-4.89],
// 4 16 -6.26 -.25 2.86 -5.5 -.25 -4.89 -4.63 -.25 -3.72 -2.82 -.25 2.86
  [4,16,-6.26,-.25,2.86,-5.5,-.25,-4.89,-4.63,-.25,-3.72,-2.82,-.25,2.86],
// 3 16 -2.82 -.25 2.86 -4.63 -.25 -3.72 -3.39 -.25 -2.55
  [3,16,-2.82,-.25,2.86,-4.63,-.25,-3.72,-3.39,-.25,-2.55],
// 3 16 -2.82 -.25 2.86 -3.39 -.25 -2.55 -1.8 -.25 -1.36
  [3,16,-2.82,-.25,2.86,-3.39,-.25,-2.55,-1.8,-.25,-1.36],
// 4 16 -2.82 -.25 2.86 -1.8 -.25 -1.36 -.63 -.25 -.61 1.32 -.25 .88
  [4,16,-2.82,-.25,2.86,-1.8,-.25,-1.36,-.63,-.25,-.61,1.32,-.25,.88],
// 4 16 -2.82 -.25 3.01 -2.82 -.25 2.86 1.32 -.25 .88 2.49 -.25 2.32
  [4,16,-2.82,-.25,3.01,-2.82,-.25,2.86,1.32,-.25,.88,2.49,-.25,2.32],
// 4 16 -2.63 -.25 4.45 -2.82 -.25 3.01 2.49 -.25 2.32 2.88 -.25 3.73
  [4,16,-2.63,-.25,4.45,-2.82,-.25,3.01,2.49,-.25,2.32,2.88,-.25,3.73],
// 4 16 -2.06 -.25 5.52 -2.63 -.25 4.45 2.88 -.25 3.73 2.7 -.25 4.84
  [4,16,-2.06,-.25,5.52,-2.63,-.25,4.45,2.88,-.25,3.73,2.7,-.25,4.84],
// 4 16 -1.13 -.25 6.18 -2.06 -.25 5.52 2.7 -.25 4.84 2.14 -.25 5.68
  [4,16,-1.13,-.25,6.18,-2.06,-.25,5.52,2.7,-.25,4.84,2.14,-.25,5.68],
// 4 16 .11 -.25 6.4 -1.13 -.25 6.18 2.14 -.25 5.68 1.26 -.25 6.22
  [4,16,.11,-.25,6.4,-1.13,-.25,6.18,2.14,-.25,5.68,1.26,-.25,6.22],
// 4 16 -6.57 -.25 -9.13 -6.29 -.25 -6.82 -19 -.25 11 -19 -.25 -11
  [4,16,-6.57,-.25,-9.13,-6.29,-.25,-6.82,-19,-.25,11,-19,-.25,-11],
// 4 16 6.49 -.25 -9.13 -6.57 -.25 -9.13 -19 -.25 -11 19 -.25 -11
  [4,16,6.49,-.25,-9.13,-6.57,-.25,-9.13,-19,-.25,-11,19,-.25,-11],
// 3 16 6.49 -.25 -5.95 6.49 -.25 -9.13 19 -.25 -11
  [3,16,6.49,-.25,-5.95,6.49,-.25,-9.13,19,-.25,-11],
// 4 16 6.49 -.25 -5.95 19 -.25 -11 6.45 -.25 2.04 5.77 -.25 .55
  [4,16,6.49,-.25,-5.95,19,-.25,-11,6.45,-.25,2.04,5.77,-.25,.55],
// 3 16 5.77 -.25 .55 4.46 -.25 -.91 6.49 -.25 -5.95
  [3,16,5.77,-.25,.55,4.46,-.25,-.91,6.49,-.25,-5.95],
// 3 16 4.46 -.25 -.91 2.3 -.25 -2.56 6.49 -.25 -5.95
  [3,16,4.46,-.25,-.91,2.3,-.25,-2.56,6.49,-.25,-5.95],
// 3 16 2.3 -.25 -2.56 1.65 -.25 -3 6.49 -.25 -5.95
  [3,16,2.3,-.25,-2.56,1.65,-.25,-3,6.49,-.25,-5.95],
// 4 16 6.49 -.25 -5.95 1.65 -.25 -3 .79 -.25 -3.55 -1.12 -.25 -4.94
  [4,16,6.49,-.25,-5.95,1.65,-.25,-3,.79,-.25,-3.55,-1.12,-.25,-4.94],
// 3 16 -1.12 -.25 -4.94 -1.97 -.25 -5.95 6.49 -.25 -5.95
  [3,16,-1.12,-.25,-4.94,-1.97,-.25,-5.95,6.49,-.25,-5.95],
// 4 16 6.45 -.25 2.04 19 -.25 -11 19 -.25 11 6.67 -.25 3.78
  [4,16,6.45,-.25,2.04,19,-.25,-11,19,-.25,11,6.67,-.25,3.78],
// 3 16 19 -.25 11 6.48 -.25 5.4 6.67 -.25 3.78
  [3,16,19,-.25,11,6.48,-.25,5.4,6.67,-.25,3.78],
// 3 16 19 -.25 11 5.91 -.25 6.79 6.48 -.25 5.4
  [3,16,19,-.25,11,5.91,-.25,6.79,6.48,-.25,5.4],
// 3 16 19 -.25 11 4.95 -.25 7.95 5.91 -.25 6.79
  [3,16,19,-.25,11,4.95,-.25,7.95,5.91,-.25,6.79],
// 3 16 19 -.25 11 3.68 -.25 8.82 4.95 -.25 7.95
  [3,16,19,-.25,11,3.68,-.25,8.82,4.95,-.25,7.95],
// 3 16 19 -.25 11 2.15 -.25 9.35 3.68 -.25 8.82
  [3,16,19,-.25,11,2.15,-.25,9.35,3.68,-.25,8.82],
// 3 16 19 -.25 11 .36 -.25 9.52 2.15 -.25 9.35
  [3,16,19,-.25,11,.36,-.25,9.52,2.15,-.25,9.35],
];
module ldraw_lib__s__004452cs02(step=0, col=false, unit=2/5, alt=false, line=0.2, solid=!$preview)
    makepoly(ldraw_lib__s__004452cs02(solid), step=step, col=col, unit=unit, alt=alt, line=line, solid=solid);
ldraw_lib__s__004452cs02(line=0.2);
// file: s/004452cs01.scad
use <../../lib.scad>
function ldraw_lib__s__004452cs01() = [
// 0 ~Sticker  1.1 x  1.9 with Number "2" - Type Face
// 0 Name: s\004452cs01.dat
// 0 Author: Takeshi Takahashi [RainbowDolphin]
// 0 !LDRAW_ORG Subpart UPDATE 2022-04
// 0 !LICENSE Licensed under CC BY 2.0 and CC BY 4.0 : see CAreadme.txt
// 
// 0 BFC CERTIFY CCW
  [0,"BFC","CERTIFY"],
  [0,"BFC","CCW"],
// 
// 0 !HISTORY 2022-07-18 [PTadmin] Official Update 2022-04
// 
// 
// 4 16 -5.5 -.25 -4.89 -6.29 -.25 -6.82 -1.97 -.25 -5.95 -4.63 -.25 -3.72
  [4,16,-5.5,-.25,-4.89,-6.29,-.25,-6.82,-1.97,-.25,-5.95,-4.63,-.25,-3.72],
// 4 16 -1.97 -.25 -5.95 -6.29 -.25 -6.82 -6.57 -.25 -9.13 6.49 -.25 -9.13
  [4,16,-1.97,-.25,-5.95,-6.29,-.25,-6.82,-6.57,-.25,-9.13,6.49,-.25,-9.13],
// 4 16 -3.39 -.25 -2.55 -4.63 -.25 -3.72 -1.12 -.25 -4.94 -1.8 -.25 -1.36
  [4,16,-3.39,-.25,-2.55,-4.63,-.25,-3.72,-1.12,-.25,-4.94,-1.8,-.25,-1.36],
// 3 16 6.49 -.25 -5.95 -1.97 -.25 -5.95 6.49 -.25 -9.13
  [3,16,6.49,-.25,-5.95,-1.97,-.25,-5.95,6.49,-.25,-9.13],
// 4 16 .79 -.25 -3.55 -.63 -.25 -.61 -1.8 -.25 -1.36 -1.12 -.25 -4.94
  [4,16,.79,-.25,-3.55,-.63,-.25,-.61,-1.8,-.25,-1.36,-1.12,-.25,-4.94],
// 3 16 -4.63 -.25 -3.72 -1.97 -.25 -5.95 -1.12 -.25 -4.94
  [3,16,-4.63,-.25,-3.72,-1.97,-.25,-5.95,-1.12,-.25,-4.94],
// 4 16 -2.63 -.25 4.45 -5.49 -.25 6.47 -6.07 -.25 4.83 -2.82 -.25 3.01
  [4,16,-2.63,-.25,4.45,-5.49,-.25,6.47,-6.07,-.25,4.83,-2.82,-.25,3.01],
// 4 16 -6.26 -.25 2.86 -2.82 -.25 2.86 -2.82 -.25 3.01 -6.07 -.25 4.83
  [4,16,-6.26,-.25,2.86,-2.82,-.25,2.86,-2.82,-.25,3.01,-6.07,-.25,4.83],
// 4 16 -4.54 -.25 7.79 -5.49 -.25 6.47 -2.06 -.25 5.52 -3.23 -.25 8.75
  [4,16,-4.54,-.25,7.79,-5.49,-.25,6.47,-2.06,-.25,5.52,-3.23,-.25,8.75],
// 4 16 -3.23 -.25 8.75 -2.06 -.25 5.52 -1.13 -.25 6.18 -1.6 -.25 9.33
  [4,16,-3.23,-.25,8.75,-2.06,-.25,5.52,-1.13,-.25,6.18,-1.6,-.25,9.33],
// 4 16 -1.6 -.25 9.33 -1.13 -.25 6.18 .11 -.25 6.4 .36 -.25 9.52
  [4,16,-1.6,-.25,9.33,-1.13,-.25,6.18,.11,-.25,6.4,.36,-.25,9.52],
// 3 16 -5.49 -.25 6.47 -2.63 -.25 4.45 -2.06 -.25 5.52
  [3,16,-5.49,-.25,6.47,-2.63,-.25,4.45,-2.06,-.25,5.52],
// 4 16 -.63 -.25 -.61 1.65 -.25 -3 2.3 -.25 -2.56 1.32 -.25 .88
  [4,16,-.63,-.25,-.61,1.65,-.25,-3,2.3,-.25,-2.56,1.32,-.25,.88],
// 4 16 4.46 -.25 -.91 2.49 -.25 2.32 1.32 -.25 .88 2.3 -.25 -2.56
  [4,16,4.46,-.25,-.91,2.49,-.25,2.32,1.32,-.25,.88,2.3,-.25,-2.56],
// 4 16 5.77 -.25 .55 6.45 -.25 2.04 2.49 -.25 2.32 4.46 -.25 -.91
  [4,16,5.77,-.25,.55,6.45,-.25,2.04,2.49,-.25,2.32,4.46,-.25,-.91],
// 4 16 2.88 -.25 3.73 2.49 -.25 2.32 6.45 -.25 2.04 6.67 -.25 3.78
  [4,16,2.88,-.25,3.73,2.49,-.25,2.32,6.45,-.25,2.04,6.67,-.25,3.78],
// 4 16 1.26 -.25 6.22 2.14 -.25 5.68 3.68 -.25 8.82 2.15 -.25 9.35
  [4,16,1.26,-.25,6.22,2.14,-.25,5.68,3.68,-.25,8.82,2.15,-.25,9.35],
// 4 16 1.26 -.25 6.22 2.15 -.25 9.35 .36 -.25 9.52 .11 -.25 6.4
  [4,16,1.26,-.25,6.22,2.15,-.25,9.35,.36,-.25,9.52,.11,-.25,6.4],
// 4 16 2.14 -.25 5.68 2.7 -.25 4.84 4.95 -.25 7.95 3.68 -.25 8.82
  [4,16,2.14,-.25,5.68,2.7,-.25,4.84,4.95,-.25,7.95,3.68,-.25,8.82],
// 4 16 2.88 -.25 3.73 6.67 -.25 3.78 6.48 -.25 5.4 2.7 -.25 4.84
  [4,16,2.88,-.25,3.73,6.67,-.25,3.78,6.48,-.25,5.4,2.7,-.25,4.84],
// 4 16 2.7 -.25 4.84 6.48 -.25 5.4 5.91 -.25 6.79 4.95 -.25 7.95
  [4,16,2.7,-.25,4.84,6.48,-.25,5.4,5.91,-.25,6.79,4.95,-.25,7.95],
// 3 16 -.63 -.25 -.61 .79 -.25 -3.55 1.65 -.25 -3
  [3,16,-.63,-.25,-.61,.79,-.25,-3.55,1.65,-.25,-3],
];
makepoly(ldraw_lib__s__004452cs01(), line=0.2);
// file: ../p/box5-12.scad
use <../lib.scad>
function ldraw_lib__box5_12() = [
// 0 Box with 5 Faces without Any Edges
// 0 Name: box5-12.dat
// 0 Author: Chris Dee [cwdee]
// 0 !LDRAW_ORG Primitive UPDATE 2009-02
// 0 !LICENSE Licensed under CC BY 2.0 and CC BY 4.0 : see CAreadme.txt
// 
// 0 BFC CERTIFY CCW
  [0,"BFC","CERTIFY"],
  [0,"BFC","CCW"],
// 
// 0 !HISTORY 2009-09-03 [PTadmin] Official Update 2009-02
// 
// 
// 4 16 1 1 1 1 1 -1 -1 1 -1 -1 1 1
  [4,16,1,1,1,1,1,-1,-1,1,-1,-1,1,1],
// 4 16 -1 0 1 1 0 1 1 1 1 -1 1 1
  [4,16,-1,0,1,1,0,1,1,1,1,-1,1,1],
// 4 16 -1 0 -1 -1 0 1 -1 1 1 -1 1 -1
  [4,16,-1,0,-1,-1,0,1,-1,1,1,-1,1,-1],
// 4 16 1 0 -1 -1 0 -1 -1 1 -1 1 1 -1
  [4,16,1,0,-1,-1,0,-1,-1,1,-1,1,1,-1],
// 4 16 1 0 1 1 0 -1 1 1 -1 1 1 1
  [4,16,1,0,1,1,0,-1,1,1,-1,1,1,1],
// 0
];
module ldraw_lib__box5_12(step=0, col=false, unit=2/5, alt=false, line=0.2, solid=!$preview)
    makepoly(ldraw_lib__box5_12(), step=step, col=col, unit=unit, alt=alt, line=line, solid=solid);
ldraw_lib__box5_12(line=0.2);
// file: 3004.scad
use <../lib.scad>
use <s/3004s01.scad>
function ldraw_lib__3004() = [
// 0 Brick  1 x  2
// 0 Name: 3004.dat
// 0 Author: James Jessiman
// 0 !LDRAW_ORG Part UPDATE 2022-05
// 0 !LICENSE Licensed under CC BY 2.0 and CC BY 4.0 : see CAreadme.txt
// 
// 0 BFC CERTIFY CCW
  [0,"BFC","CERTIFY"],
  [0,"BFC","CCW"],
// 
// 0 !HISTORY 2001-10-26 [PTadmin] Official Update 2001-01
// 0 !HISTORY 2002-05-07 {unknown} BFC Certification
// 0 !HISTORY 2002-06-11 [PTadmin] Official Update 2002-03
// 0 !HISTORY 2007-05-07 [PTadmin] Header formatted for Contributor Agreement
// 0 !HISTORY 2008-07-01 [PTadmin] Official Update 2008-01
// 0 !HISTORY 2022-08-04 [MagFors] Using subfile
// 0 !HISTORY 2022-09-15 [PTadmin] Official Update 2022-05
// 
// 
// 1 16 0 0 0 1 0 0 0 1 0 0 0 1 s\3004s01.dat
  [1,16,0,0,0,1,0,0,0,1,0,0,0,1, ldraw_lib__s__3004s01()],
// 4 16 -20 24 -10 20 24 -10 20 0 -10 -20 0 -10
  [4,16,-20,24,-10,20,24,-10,20,0,-10,-20,0,-10],
];
module ldraw_lib__3004(step=0, col=false, unit=2/5, alt=false, line=0.2, solid=!$preview)
    makepoly(ldraw_lib__3004(), step=step, col=col, unit=unit, alt=alt, line=line, solid=solid);
ldraw_lib__3004(line=0.2);
// file: 004659g.scad
use <../lib.scad>
use <../p/box5-12.scad>
use <s/004452cs01.scad>
use <s/004452cs02.scad>
function ldraw_lib__004659g() = [
// 0 Sticker  1.1 x  1.9 with White Number "2" on Red Background
// 0 Name: 004659g.dat
// 0 Author: Alex Taylor [anathema]
// 0 !LDRAW_ORG Part UPDATE 2022-04
// 0 !LICENSE Licensed under CC BY 2.0 and CC BY 4.0 : see CAreadme.txt
// 
// 0 BFC CERTIFY CCW
  [0,"BFC","CERTIFY"],
  [0,"BFC","CCW"],
// 
// 0 !KEYWORDS Fire Station, Set 590-1
// 
// 0 !HISTORY 2019-09-08 [anathema] Original pattern using TEXMAP
// 0 !HISTORY 2021-03-09 [RainbowDolphin] Vectorized the pattern and used common subfile with 004452c
// 0 !HISTORY 2022-07-18 [PTadmin] Official Update 2022-04
// 
// 
// 1 16 0 -0.25 0 19 0 0 0 0.25 0 0 0 11 box5-12.dat
  [1,16,0,-0.25,0,19,0,0,0,0.25,0,0,0,11, ldraw_lib__box5_12()],
// 1 15 0 0 0 1 0 0 0 1 0 0 0 1 s\004452cs01.dat
  [1,15,0,0,0,1,0,0,0,1,0,0,0,1, ldraw_lib__s__004452cs01()],
// 1 4 0 0 0 1 0 0 0 1 0 0 0 1 s\004452cs02.dat
  [1,4,0,0,0,1,0,0,0,1,0,0,0,1, ldraw_lib__s__004452cs02()],
];
makepoly(ldraw_lib__004659g(), line=0.2);
// main file
use <../lib.scad>
use <004659g.scad>
use <3004.scad>
function ldraw_lib__3004d0a() = [
// 0 Brick  1 x  2 with White Number "2" on Red Background Sticker
// 0 Name: 3004d0a.dat
// 0 Author: Takeshi Takahashi [RainbowDolphin]
// 0 !LDRAW_ORG Shortcut UPDATE 2024-04
// 0 !LICENSE Licensed under CC BY 4.0 : see CAreadme.txt
// 
// 0 BFC CERTIFY CCW
  [0,"BFC","CERTIFY"],
  [0,"BFC","CCW"],
// 
// 0 !CATEGORY Sticker Shortcut
// 0 !KEYWORDS Engine Co. No. 9, Fire Station, Set 590-1
// 
// 0 !HISTORY 2024-05-28 [OrionP] Official Update 2024-04
// 
// 1 16 0 0 0 1 0 0 0 1 0 0 0 1 3004.dat
  [1,16,0,0,0,1,0,0,0,1,0,0,0,1, ldraw_lib__3004()],
// 1 16 0 12 -10 1 0 0 0 0 -1 0 1 0 004659g.dat
  [1,16,0,12,-10,1,0,0,0,0,-1,0,1,0, ldraw_lib__004659g()],
];
module ldraw_lib__3004d0a(step=0, col=false, unit=2/5, alt=false, line=0.2, solid=!$preview)
    makepoly(ldraw_lib__3004d0a(), step=step, col=col, unit=unit, alt=alt, line=line, solid=solid);
ldraw_lib__3004d0a(line=0.2);
